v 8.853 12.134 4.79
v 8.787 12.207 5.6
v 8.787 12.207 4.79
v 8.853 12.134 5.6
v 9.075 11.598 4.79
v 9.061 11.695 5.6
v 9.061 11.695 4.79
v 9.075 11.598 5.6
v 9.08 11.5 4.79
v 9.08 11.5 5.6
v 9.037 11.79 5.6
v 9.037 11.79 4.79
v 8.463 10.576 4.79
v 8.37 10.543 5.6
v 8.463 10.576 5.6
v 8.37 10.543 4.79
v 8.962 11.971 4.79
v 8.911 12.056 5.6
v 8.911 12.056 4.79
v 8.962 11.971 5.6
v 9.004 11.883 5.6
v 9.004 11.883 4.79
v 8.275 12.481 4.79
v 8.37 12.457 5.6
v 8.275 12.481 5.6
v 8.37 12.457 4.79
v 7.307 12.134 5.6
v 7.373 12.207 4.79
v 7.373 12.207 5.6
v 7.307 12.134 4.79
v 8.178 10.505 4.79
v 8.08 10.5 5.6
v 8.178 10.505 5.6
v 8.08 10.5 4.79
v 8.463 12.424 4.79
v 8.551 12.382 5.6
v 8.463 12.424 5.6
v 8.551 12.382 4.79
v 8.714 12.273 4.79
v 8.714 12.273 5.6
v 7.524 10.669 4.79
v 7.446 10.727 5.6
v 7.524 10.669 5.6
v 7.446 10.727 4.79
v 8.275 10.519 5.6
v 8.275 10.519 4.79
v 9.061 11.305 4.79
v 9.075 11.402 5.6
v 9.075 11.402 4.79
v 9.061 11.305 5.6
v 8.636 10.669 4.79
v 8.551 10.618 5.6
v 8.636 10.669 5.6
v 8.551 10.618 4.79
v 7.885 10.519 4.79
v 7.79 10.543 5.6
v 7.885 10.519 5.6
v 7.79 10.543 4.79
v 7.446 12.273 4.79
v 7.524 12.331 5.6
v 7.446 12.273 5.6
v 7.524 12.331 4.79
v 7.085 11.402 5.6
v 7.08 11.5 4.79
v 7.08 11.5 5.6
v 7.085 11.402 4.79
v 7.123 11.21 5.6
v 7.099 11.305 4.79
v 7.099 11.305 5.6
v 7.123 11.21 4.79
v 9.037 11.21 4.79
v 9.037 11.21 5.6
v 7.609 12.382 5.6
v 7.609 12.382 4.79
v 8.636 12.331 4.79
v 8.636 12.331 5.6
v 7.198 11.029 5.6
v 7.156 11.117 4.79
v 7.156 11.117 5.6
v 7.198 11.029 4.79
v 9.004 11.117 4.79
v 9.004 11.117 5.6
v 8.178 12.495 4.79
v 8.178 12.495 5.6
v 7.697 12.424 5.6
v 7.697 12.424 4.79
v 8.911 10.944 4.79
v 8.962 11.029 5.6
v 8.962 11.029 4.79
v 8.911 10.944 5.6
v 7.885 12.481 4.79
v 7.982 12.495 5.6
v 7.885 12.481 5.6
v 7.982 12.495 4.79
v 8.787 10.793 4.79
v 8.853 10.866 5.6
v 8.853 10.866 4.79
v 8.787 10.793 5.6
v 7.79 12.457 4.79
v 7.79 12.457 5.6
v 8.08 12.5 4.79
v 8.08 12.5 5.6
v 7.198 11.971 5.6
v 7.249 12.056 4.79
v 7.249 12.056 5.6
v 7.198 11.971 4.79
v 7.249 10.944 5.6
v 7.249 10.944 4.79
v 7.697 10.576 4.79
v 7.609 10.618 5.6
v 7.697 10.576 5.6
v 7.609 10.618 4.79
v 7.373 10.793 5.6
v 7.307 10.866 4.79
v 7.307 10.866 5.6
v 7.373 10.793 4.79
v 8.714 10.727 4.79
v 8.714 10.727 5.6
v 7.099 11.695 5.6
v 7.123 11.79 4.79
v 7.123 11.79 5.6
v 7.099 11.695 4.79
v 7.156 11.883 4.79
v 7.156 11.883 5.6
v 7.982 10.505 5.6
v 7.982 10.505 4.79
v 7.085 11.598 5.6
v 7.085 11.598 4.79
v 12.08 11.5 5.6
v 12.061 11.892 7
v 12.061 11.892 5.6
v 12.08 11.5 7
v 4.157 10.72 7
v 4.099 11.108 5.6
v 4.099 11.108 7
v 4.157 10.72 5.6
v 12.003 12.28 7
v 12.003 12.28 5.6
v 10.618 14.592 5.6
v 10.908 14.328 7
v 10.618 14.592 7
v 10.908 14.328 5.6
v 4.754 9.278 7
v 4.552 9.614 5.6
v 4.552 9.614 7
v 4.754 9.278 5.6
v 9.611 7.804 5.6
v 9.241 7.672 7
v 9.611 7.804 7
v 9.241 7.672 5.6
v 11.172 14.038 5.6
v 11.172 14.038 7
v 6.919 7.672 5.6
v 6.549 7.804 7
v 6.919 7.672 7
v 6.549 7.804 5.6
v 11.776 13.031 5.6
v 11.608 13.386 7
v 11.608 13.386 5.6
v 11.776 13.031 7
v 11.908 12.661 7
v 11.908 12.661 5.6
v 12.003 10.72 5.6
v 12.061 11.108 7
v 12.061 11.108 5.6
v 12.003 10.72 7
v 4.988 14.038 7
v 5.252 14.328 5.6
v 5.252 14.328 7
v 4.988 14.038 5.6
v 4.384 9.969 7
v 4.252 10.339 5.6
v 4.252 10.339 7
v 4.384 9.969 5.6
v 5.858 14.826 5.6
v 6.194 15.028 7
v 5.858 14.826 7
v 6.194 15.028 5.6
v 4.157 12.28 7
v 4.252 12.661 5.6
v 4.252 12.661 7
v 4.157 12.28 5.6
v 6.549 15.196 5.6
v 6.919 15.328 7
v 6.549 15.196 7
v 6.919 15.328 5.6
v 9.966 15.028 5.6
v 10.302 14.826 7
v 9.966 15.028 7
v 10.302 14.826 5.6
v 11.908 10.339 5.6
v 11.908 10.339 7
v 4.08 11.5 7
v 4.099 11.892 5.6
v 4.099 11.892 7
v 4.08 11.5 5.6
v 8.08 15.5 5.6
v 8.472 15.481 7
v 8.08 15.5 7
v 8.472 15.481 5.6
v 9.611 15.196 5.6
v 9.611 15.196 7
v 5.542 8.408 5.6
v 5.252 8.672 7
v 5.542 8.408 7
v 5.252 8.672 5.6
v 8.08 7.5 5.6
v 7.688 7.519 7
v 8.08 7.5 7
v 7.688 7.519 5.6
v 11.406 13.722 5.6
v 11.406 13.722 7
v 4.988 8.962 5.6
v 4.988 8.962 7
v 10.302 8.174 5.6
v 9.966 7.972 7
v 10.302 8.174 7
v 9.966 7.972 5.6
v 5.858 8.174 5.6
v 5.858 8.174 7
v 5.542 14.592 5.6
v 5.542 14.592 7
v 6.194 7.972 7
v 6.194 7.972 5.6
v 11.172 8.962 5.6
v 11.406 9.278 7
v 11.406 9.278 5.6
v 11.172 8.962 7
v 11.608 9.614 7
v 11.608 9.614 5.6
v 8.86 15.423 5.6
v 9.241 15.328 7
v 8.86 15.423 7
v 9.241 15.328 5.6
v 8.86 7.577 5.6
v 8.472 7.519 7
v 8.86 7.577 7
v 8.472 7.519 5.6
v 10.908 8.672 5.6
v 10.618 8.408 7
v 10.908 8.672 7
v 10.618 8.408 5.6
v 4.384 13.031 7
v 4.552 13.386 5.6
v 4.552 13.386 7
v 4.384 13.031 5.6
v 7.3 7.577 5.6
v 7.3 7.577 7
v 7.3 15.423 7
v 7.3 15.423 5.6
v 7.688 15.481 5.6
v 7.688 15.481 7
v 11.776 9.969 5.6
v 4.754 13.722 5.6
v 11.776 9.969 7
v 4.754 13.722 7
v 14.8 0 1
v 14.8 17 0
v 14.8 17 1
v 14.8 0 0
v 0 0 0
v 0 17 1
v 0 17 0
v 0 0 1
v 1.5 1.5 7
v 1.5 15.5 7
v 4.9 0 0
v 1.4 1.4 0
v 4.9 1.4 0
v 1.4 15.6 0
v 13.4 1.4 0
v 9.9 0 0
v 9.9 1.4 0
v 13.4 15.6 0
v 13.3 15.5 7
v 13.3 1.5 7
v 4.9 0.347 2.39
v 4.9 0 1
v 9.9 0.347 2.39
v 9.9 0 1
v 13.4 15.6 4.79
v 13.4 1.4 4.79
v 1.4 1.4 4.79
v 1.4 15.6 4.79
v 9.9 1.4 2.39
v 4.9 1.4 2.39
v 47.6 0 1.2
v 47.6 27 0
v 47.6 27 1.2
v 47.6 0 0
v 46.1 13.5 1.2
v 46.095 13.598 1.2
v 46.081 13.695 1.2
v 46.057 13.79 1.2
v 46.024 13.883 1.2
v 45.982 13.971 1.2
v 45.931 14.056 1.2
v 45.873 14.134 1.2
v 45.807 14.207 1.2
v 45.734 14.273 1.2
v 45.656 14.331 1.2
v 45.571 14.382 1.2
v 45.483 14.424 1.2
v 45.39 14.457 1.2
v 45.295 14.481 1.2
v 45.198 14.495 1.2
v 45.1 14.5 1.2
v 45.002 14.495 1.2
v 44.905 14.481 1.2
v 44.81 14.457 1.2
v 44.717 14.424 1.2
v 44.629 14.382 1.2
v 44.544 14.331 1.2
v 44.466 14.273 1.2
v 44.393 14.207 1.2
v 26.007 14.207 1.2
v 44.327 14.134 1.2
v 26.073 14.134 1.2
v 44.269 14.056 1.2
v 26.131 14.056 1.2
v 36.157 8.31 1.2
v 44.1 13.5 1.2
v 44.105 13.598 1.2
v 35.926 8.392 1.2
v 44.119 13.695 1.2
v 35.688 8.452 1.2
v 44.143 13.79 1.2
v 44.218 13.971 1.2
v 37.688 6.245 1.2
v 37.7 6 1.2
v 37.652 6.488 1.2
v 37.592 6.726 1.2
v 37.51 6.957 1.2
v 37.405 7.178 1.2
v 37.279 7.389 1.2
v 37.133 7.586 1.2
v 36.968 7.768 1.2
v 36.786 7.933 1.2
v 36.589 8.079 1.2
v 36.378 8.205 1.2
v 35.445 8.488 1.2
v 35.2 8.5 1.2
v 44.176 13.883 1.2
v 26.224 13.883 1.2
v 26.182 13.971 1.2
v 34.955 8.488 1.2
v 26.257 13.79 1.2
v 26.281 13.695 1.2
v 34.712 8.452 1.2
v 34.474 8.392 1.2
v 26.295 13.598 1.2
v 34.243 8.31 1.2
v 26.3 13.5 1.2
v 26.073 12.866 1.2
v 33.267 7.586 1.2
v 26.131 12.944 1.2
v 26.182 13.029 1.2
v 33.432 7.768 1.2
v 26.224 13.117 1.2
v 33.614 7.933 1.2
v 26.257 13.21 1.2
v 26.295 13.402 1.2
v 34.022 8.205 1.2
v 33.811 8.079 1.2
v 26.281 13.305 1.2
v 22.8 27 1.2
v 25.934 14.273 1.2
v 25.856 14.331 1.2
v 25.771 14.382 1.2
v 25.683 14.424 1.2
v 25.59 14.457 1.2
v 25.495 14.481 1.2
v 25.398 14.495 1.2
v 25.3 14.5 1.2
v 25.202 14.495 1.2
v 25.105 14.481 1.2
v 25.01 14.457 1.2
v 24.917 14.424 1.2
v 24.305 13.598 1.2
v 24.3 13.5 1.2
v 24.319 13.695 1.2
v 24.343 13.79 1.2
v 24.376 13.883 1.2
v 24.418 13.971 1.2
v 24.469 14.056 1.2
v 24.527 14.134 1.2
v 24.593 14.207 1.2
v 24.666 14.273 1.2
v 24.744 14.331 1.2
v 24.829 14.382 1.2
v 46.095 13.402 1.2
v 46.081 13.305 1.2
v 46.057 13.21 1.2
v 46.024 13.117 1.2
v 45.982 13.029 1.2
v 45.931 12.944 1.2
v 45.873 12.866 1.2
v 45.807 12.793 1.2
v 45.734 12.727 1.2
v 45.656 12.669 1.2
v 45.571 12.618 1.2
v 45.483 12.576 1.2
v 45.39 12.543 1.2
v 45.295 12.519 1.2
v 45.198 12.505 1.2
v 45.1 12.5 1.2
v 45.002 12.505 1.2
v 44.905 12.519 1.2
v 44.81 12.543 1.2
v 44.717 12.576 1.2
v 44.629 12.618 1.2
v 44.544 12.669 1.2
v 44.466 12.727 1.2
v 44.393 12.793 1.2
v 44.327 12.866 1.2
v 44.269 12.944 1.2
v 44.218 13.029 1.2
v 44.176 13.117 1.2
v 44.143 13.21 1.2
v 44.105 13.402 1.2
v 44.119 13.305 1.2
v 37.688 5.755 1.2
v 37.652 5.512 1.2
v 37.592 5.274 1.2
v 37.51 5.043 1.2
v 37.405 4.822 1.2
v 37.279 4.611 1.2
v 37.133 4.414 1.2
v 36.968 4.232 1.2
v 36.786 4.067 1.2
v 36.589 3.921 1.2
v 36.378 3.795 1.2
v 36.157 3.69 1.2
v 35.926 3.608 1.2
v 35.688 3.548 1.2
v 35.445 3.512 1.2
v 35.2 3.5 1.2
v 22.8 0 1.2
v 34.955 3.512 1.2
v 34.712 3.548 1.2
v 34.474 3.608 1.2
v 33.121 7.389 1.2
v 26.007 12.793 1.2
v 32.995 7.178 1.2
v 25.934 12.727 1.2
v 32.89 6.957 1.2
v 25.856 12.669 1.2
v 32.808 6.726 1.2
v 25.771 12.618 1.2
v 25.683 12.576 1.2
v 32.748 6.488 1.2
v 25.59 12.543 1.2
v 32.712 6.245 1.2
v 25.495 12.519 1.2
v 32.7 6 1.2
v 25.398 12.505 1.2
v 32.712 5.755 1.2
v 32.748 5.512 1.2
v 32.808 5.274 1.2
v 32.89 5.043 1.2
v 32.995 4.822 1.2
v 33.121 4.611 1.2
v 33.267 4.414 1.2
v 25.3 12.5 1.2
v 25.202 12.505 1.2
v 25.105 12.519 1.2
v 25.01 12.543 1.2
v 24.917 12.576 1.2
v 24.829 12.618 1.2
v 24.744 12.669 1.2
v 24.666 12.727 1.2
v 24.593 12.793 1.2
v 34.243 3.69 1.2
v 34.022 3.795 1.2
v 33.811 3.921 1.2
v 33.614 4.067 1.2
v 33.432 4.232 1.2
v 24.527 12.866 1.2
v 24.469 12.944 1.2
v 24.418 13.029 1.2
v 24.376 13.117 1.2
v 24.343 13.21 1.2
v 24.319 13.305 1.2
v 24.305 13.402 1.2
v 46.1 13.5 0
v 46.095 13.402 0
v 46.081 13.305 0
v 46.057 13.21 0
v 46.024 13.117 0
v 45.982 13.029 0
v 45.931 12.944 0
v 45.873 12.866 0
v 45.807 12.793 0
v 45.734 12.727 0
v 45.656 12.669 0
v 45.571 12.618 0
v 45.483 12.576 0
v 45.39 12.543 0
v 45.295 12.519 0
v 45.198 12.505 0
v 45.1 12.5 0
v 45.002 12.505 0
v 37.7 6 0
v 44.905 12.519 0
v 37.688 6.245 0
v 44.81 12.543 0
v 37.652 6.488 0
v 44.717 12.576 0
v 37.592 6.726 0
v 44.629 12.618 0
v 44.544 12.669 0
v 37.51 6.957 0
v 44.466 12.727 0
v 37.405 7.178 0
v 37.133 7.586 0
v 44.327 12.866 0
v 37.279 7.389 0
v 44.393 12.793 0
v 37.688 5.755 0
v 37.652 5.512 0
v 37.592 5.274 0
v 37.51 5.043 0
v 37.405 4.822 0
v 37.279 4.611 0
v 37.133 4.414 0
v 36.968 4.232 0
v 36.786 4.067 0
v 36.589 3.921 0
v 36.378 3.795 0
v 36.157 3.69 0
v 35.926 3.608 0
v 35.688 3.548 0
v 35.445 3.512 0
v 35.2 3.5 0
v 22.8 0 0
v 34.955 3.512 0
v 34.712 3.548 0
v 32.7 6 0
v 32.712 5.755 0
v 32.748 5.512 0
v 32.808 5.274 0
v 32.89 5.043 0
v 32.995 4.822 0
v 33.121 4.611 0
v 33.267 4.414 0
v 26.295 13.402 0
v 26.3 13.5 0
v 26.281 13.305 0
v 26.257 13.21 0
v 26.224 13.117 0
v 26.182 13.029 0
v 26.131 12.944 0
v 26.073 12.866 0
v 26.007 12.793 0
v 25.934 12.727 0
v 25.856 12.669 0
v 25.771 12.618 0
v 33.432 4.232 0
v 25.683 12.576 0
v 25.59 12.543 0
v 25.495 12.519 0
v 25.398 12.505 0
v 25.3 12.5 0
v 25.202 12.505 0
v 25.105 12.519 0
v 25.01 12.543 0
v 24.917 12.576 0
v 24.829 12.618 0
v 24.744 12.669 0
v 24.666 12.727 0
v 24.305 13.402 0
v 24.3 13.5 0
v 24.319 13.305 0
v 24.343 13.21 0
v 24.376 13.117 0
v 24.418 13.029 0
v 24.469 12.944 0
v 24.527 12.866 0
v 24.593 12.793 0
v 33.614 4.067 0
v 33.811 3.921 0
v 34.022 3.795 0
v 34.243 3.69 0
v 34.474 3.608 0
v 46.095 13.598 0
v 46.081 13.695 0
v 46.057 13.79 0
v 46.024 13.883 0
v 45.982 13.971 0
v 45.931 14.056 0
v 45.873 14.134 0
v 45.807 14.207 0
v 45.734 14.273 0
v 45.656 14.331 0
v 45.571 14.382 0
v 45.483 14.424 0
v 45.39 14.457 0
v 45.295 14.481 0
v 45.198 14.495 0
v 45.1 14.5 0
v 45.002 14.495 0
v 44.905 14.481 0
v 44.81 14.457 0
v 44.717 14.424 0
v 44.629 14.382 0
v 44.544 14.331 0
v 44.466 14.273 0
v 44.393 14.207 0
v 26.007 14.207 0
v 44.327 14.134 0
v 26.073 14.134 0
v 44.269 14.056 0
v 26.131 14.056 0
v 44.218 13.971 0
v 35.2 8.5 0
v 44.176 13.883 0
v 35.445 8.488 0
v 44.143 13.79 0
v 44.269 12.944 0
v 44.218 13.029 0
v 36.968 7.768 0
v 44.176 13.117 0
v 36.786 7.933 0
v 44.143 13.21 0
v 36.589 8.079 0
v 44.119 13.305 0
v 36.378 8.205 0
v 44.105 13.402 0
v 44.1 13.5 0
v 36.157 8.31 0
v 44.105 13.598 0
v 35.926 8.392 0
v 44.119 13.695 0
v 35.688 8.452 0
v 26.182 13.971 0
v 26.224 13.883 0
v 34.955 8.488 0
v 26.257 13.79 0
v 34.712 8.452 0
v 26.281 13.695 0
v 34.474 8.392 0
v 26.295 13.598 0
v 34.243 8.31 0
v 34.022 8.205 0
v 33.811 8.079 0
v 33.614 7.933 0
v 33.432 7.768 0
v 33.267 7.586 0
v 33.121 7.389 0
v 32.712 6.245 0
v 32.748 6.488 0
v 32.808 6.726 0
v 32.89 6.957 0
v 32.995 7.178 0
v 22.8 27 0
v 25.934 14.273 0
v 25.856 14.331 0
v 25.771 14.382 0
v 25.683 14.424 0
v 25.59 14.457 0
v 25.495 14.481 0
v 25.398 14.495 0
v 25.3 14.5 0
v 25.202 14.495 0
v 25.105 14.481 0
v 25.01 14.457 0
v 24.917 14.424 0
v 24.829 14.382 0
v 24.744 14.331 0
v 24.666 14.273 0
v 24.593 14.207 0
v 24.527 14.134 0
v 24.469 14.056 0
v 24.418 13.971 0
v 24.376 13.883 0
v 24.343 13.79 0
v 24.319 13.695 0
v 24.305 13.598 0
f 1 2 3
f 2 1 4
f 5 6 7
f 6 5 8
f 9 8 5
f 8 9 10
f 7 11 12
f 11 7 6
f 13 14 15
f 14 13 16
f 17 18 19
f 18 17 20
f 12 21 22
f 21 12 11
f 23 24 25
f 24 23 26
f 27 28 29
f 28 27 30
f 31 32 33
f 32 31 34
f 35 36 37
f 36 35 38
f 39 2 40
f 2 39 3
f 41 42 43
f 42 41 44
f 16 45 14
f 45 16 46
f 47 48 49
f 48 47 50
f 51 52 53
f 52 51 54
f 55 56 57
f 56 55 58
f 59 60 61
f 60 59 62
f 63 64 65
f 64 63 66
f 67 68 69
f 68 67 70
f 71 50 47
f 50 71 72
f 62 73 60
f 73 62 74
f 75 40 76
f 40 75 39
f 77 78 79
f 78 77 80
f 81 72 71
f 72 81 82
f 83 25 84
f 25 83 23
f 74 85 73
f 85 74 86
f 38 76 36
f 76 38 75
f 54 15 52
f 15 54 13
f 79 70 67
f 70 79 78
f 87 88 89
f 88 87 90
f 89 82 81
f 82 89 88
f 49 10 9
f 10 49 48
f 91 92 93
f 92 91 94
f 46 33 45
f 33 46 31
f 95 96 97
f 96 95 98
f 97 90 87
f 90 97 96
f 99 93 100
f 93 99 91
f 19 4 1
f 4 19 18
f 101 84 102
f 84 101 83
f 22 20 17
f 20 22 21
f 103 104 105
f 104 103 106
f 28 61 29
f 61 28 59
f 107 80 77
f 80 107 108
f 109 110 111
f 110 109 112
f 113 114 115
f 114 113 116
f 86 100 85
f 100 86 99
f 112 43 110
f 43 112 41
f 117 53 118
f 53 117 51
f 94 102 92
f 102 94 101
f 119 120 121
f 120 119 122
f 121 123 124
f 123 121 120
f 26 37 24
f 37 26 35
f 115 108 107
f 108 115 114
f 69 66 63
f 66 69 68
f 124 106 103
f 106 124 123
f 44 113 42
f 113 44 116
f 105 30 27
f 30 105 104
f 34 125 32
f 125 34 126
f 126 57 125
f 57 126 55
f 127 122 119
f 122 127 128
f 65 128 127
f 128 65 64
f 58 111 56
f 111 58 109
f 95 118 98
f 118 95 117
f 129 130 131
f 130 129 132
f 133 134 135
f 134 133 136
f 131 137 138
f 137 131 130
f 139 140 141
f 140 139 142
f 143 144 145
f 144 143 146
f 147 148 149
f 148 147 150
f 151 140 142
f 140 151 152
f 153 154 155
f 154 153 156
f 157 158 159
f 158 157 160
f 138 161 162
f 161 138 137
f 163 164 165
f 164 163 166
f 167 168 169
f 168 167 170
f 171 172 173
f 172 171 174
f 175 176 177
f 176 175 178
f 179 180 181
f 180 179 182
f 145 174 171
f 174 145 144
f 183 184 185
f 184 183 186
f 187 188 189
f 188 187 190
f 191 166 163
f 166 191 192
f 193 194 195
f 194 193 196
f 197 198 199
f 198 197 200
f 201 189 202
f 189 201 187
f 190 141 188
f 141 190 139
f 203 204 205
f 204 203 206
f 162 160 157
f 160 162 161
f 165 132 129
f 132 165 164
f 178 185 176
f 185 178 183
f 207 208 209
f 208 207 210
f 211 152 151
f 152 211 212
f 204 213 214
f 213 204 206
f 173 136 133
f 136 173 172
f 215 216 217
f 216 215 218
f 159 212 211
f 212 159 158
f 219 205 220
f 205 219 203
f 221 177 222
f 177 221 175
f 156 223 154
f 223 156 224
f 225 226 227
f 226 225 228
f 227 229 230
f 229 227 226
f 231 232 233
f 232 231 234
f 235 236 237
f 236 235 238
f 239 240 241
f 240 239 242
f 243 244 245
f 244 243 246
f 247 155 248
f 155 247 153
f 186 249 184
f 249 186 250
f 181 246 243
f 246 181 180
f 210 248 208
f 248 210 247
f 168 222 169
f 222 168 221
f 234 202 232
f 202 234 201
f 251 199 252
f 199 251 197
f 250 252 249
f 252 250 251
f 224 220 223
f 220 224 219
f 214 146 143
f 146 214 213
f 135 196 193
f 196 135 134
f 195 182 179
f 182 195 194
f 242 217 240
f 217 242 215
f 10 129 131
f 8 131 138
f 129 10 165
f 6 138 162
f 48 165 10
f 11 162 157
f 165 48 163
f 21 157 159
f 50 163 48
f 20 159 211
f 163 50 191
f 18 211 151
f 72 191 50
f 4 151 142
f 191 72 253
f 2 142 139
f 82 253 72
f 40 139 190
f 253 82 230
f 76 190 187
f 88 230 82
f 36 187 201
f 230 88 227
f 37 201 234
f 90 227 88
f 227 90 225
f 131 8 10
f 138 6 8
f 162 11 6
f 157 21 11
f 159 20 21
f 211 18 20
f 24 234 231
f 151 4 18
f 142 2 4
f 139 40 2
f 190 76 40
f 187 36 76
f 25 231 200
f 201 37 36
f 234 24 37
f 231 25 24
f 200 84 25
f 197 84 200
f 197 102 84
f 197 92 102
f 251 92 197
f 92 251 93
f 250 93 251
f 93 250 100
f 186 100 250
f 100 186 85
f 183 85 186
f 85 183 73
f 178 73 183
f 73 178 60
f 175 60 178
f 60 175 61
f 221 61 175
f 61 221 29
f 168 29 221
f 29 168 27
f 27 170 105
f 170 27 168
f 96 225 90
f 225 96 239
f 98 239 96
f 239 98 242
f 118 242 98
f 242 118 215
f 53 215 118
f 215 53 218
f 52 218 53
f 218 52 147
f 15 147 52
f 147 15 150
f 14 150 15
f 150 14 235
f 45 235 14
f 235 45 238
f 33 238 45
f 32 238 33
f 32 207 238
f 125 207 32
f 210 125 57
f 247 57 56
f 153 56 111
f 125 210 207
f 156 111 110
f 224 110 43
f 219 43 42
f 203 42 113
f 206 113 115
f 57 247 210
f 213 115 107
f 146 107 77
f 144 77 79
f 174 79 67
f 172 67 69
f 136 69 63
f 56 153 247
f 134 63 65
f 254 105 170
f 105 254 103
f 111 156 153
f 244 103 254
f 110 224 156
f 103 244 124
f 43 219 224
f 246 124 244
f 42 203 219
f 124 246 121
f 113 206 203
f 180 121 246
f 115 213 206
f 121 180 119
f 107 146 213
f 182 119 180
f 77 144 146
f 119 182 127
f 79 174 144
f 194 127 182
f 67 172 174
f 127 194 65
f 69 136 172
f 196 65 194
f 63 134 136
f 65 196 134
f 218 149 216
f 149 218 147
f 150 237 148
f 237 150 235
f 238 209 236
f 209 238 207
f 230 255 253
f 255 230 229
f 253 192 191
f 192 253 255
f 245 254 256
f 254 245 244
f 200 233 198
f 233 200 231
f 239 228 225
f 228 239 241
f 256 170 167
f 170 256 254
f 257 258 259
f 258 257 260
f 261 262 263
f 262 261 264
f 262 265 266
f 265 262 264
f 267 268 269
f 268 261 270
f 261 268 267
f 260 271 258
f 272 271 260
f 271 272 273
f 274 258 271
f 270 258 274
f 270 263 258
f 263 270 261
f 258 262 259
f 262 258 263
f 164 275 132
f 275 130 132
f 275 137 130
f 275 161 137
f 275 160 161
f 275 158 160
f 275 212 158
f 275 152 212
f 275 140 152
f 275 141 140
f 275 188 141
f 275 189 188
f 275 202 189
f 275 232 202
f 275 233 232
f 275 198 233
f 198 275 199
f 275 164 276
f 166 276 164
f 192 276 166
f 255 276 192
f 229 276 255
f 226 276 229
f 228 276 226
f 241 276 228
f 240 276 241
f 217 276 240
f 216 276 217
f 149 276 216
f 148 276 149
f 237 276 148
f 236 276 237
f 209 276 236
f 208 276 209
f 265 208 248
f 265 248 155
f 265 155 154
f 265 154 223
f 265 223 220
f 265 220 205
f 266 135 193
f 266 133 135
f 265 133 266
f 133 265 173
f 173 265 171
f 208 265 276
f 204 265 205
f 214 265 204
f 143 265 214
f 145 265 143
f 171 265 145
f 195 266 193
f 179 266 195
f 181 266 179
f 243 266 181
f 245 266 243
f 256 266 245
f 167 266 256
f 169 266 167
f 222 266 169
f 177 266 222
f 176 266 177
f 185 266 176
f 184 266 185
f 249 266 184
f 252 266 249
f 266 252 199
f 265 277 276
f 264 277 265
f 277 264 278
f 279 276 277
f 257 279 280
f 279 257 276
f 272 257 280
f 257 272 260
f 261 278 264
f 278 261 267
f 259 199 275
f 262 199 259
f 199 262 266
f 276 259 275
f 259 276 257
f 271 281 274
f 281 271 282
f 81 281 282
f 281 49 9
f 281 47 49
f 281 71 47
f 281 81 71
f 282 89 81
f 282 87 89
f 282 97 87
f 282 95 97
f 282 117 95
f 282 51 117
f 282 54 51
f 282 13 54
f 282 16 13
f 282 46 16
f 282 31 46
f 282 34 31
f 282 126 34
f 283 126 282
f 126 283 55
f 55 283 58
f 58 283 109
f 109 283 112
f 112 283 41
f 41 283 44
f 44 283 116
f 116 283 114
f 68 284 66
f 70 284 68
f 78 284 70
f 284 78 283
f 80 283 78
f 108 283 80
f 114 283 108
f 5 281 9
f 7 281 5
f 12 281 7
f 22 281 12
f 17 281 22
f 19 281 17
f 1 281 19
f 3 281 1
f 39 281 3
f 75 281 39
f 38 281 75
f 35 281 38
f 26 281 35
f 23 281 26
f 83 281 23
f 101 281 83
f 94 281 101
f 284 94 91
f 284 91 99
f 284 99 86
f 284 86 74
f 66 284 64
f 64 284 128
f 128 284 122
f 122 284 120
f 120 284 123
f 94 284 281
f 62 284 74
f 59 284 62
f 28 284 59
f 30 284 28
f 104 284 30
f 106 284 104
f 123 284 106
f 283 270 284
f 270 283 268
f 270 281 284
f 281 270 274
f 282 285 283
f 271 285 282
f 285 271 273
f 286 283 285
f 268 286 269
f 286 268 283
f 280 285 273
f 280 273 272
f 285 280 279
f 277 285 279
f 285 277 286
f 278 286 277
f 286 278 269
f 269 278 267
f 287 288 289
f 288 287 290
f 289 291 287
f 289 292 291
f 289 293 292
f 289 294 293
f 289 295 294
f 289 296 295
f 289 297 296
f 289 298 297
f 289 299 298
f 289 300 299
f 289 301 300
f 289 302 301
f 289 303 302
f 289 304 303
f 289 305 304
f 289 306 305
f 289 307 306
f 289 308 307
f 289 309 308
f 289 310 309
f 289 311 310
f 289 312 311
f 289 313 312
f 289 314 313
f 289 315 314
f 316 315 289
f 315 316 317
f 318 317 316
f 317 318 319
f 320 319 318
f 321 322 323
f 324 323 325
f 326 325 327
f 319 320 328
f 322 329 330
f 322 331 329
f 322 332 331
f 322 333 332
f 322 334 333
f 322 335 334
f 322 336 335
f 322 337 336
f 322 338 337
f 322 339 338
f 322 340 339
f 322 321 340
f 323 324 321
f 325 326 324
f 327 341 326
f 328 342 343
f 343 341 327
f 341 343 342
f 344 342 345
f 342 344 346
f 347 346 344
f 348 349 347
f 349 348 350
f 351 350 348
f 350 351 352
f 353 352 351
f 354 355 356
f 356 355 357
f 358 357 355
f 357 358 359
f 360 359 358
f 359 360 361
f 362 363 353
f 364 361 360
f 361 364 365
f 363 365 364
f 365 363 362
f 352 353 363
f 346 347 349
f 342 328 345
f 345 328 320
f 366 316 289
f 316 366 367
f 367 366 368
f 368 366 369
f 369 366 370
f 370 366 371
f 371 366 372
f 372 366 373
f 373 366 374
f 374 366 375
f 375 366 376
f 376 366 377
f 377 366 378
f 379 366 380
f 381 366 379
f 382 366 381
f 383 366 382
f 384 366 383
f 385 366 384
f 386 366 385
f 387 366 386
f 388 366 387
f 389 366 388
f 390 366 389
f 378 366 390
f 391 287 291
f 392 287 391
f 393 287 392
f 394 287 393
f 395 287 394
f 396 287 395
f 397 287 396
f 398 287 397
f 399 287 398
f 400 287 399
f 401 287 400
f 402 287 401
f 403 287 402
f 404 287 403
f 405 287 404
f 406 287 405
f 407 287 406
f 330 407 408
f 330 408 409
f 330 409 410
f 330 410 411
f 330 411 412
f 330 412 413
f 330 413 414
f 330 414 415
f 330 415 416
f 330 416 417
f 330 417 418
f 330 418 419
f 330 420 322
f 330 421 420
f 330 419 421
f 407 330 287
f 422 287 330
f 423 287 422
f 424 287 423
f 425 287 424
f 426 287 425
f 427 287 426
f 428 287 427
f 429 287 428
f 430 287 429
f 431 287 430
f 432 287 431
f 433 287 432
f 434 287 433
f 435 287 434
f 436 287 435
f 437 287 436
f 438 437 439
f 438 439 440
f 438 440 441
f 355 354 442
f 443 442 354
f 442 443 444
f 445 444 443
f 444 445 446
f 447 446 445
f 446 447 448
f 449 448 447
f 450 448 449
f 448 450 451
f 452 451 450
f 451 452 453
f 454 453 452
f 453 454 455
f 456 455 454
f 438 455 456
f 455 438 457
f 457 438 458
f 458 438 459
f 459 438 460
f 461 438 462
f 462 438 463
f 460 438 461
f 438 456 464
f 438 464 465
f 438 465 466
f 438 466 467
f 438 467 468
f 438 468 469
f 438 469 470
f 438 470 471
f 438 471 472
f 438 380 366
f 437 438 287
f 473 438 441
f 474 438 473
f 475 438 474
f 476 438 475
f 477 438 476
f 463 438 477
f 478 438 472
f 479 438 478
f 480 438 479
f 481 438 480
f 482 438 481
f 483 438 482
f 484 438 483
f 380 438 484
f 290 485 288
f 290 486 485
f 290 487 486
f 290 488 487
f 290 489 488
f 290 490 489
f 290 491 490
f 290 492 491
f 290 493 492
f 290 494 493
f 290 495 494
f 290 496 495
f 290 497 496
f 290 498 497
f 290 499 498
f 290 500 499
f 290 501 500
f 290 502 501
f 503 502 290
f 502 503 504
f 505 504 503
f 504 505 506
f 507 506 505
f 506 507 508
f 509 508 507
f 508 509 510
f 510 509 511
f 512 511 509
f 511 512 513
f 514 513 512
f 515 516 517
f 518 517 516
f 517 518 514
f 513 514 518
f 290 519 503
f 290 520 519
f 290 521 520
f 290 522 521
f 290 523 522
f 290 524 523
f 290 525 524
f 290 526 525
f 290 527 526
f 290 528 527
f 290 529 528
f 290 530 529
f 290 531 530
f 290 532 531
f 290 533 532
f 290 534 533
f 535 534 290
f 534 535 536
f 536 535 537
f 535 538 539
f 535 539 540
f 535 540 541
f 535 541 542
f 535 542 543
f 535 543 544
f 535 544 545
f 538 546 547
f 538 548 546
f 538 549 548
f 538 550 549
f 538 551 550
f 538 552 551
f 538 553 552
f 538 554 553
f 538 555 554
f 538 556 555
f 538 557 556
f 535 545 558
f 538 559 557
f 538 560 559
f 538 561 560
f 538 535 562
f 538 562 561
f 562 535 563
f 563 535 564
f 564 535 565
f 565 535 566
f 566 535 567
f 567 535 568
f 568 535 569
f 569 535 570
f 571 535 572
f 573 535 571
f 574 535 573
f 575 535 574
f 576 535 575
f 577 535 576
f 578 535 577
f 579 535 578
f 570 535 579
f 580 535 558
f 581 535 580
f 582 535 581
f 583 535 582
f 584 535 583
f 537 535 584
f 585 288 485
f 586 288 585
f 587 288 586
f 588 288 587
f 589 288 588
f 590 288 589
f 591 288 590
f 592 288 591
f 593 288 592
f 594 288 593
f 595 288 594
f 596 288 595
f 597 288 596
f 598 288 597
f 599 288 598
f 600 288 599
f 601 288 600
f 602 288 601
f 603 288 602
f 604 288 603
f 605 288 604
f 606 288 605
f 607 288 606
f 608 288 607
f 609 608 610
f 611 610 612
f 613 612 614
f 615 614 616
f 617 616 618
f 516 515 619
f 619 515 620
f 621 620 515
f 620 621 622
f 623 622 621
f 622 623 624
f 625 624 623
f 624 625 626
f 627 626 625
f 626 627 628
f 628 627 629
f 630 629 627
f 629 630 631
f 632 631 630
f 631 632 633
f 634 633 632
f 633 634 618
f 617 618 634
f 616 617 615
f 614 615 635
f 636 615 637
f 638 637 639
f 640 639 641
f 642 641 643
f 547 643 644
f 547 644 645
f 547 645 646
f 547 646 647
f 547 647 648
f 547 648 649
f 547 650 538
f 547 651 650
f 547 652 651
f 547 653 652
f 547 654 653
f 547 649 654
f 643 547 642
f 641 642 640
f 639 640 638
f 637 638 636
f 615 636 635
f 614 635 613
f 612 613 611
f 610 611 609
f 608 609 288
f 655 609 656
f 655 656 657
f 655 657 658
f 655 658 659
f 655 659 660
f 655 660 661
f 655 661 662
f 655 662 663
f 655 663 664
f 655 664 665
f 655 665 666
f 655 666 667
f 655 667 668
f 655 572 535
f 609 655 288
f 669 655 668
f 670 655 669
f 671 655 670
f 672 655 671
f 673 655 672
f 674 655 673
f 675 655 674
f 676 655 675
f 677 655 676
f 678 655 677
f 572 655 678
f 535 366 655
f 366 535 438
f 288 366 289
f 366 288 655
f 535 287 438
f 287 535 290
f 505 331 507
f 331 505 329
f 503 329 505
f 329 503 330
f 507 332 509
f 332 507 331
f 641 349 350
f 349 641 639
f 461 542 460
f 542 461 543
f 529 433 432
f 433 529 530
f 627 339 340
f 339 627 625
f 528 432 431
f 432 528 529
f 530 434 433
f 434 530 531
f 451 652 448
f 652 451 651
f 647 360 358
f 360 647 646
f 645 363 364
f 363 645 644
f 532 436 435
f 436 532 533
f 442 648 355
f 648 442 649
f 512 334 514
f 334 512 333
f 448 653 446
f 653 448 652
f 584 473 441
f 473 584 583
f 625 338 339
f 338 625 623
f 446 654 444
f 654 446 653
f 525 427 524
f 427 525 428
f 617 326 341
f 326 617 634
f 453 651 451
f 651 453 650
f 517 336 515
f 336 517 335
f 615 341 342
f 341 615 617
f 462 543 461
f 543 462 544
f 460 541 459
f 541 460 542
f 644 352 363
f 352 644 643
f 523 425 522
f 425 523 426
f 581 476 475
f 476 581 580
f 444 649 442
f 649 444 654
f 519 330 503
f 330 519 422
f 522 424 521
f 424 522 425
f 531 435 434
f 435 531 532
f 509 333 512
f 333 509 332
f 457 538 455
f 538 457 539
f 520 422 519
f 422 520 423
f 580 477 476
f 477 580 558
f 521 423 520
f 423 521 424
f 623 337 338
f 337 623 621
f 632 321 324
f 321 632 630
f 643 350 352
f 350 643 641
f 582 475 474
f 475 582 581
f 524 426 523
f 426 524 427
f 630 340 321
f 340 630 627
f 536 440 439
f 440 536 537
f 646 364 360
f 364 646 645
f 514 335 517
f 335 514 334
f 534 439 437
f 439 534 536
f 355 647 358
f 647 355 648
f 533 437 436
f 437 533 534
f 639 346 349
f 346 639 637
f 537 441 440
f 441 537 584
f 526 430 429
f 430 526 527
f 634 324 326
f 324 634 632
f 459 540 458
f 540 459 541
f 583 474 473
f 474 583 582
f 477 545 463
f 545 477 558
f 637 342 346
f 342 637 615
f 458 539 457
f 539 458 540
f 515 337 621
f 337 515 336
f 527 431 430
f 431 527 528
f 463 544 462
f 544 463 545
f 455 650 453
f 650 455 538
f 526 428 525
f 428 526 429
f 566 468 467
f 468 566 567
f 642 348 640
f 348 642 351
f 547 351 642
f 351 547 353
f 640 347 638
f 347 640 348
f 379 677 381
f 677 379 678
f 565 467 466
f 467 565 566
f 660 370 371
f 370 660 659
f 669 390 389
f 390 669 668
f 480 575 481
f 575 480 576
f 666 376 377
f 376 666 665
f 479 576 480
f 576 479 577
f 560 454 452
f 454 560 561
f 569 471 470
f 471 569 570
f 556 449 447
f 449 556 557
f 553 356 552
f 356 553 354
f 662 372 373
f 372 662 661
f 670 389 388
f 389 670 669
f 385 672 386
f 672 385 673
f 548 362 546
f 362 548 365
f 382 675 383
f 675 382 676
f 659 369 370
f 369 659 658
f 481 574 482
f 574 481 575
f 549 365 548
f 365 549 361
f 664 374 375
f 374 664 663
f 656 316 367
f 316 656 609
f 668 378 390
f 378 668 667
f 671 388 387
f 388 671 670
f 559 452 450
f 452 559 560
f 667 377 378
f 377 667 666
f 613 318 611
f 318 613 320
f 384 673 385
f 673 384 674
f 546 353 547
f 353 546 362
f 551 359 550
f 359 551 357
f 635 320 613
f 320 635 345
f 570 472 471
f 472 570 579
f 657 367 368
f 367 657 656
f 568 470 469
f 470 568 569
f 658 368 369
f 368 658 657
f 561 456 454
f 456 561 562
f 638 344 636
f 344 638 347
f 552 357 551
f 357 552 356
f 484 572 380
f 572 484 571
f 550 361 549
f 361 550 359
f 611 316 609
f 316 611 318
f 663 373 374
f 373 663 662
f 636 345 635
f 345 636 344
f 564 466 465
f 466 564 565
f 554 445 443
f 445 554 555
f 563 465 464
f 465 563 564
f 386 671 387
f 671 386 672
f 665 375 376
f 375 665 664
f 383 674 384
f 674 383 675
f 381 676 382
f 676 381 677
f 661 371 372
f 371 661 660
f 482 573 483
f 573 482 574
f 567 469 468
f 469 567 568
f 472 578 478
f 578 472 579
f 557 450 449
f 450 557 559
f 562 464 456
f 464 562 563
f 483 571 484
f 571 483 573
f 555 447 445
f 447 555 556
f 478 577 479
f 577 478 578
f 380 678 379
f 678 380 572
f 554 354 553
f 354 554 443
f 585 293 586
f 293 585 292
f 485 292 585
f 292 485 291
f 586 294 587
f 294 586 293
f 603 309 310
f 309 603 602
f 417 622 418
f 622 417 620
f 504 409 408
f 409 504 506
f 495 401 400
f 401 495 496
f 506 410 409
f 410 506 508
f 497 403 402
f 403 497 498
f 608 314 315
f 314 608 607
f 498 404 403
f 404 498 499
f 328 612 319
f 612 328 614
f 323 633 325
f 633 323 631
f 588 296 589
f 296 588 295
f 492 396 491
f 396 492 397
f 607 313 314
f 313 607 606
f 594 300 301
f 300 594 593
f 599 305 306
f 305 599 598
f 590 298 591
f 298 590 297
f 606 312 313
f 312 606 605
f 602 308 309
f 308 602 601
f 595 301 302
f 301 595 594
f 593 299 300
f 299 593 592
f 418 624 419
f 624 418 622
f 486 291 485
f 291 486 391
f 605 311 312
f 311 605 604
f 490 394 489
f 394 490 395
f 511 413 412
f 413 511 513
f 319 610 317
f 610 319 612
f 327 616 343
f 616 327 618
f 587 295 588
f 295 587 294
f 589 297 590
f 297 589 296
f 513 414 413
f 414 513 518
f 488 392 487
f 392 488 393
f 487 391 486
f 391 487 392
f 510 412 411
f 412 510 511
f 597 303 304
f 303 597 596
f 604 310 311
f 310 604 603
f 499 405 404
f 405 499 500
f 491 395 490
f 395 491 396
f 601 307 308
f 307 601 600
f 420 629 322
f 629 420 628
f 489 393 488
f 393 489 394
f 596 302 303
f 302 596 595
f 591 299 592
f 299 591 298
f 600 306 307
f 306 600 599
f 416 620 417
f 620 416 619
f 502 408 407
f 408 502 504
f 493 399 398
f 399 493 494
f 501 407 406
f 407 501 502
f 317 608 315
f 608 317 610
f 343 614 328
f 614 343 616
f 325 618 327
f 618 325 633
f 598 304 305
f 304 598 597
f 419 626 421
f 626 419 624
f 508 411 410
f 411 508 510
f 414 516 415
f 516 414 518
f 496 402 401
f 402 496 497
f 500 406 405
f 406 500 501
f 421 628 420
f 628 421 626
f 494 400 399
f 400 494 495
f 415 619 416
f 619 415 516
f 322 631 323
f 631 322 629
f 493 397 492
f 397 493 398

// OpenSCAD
// file: params.scad
// ANC helmet - shared mechanical parameters (mm).
// MEASURE YOUR EARMUFF and edit the "cup" block; everything else follows.

// ---- helmet-mount earmuff cup (inside, after removing the stock foam insert) ----
cup_a        = 72;    // inner long axis (vertical when worn)
cup_b        = 62;    // inner short axis
cup_depth    = 32;    // inner depth, rim to back wall
cup_wall     = 2.5;   // shell thickness where the outside mic sits

// ---- boards (must match hardware/gen/layouts.py; `python3 check_fit.py` verifies) ----
main_w = 60;  main_h = 50;  main_r = 14;
main_holes = [[7.2, 8.8], [52.8, 42.8], [6.8, 43.2]];  // from the board's top-left corner
sat_w  = 34;  sat_h  = 26;  sat_r  = 5;
sat_holes  = [[9.5, 3.5], [30, 22]];
mic_w  = 11;  mic_h  = 13.2;
mic_port   = [6.18, 3.6];                           // sound hole on the mic board (PCB underside)
pcb_t  = 1.6;

// ---- parts that live in the cups ----
driver_d      = 40.2;   // 40 mm headphone driver
driver_depth  = 6.0;
batt          = [50, 34, 10.5];   // 103450 LiPo pouch, 2000 mAh (with protection PCB)
m2_clear      = 2.3;
m2_insert_d   = 3.2;    // heat-set insert hole
standoff_h    = 4.0;

$fn = 64;

module rounded_rect(w, h, r, t) {
    linear_extrude(t) offset(r) offset(-r) square([w, h]);
}

module ellipse(a, b, t) { linear_extrude(t) scale([a / 2, b / 2]) circle(1); }
// main file
// Outside (reference) mic pod: glued/screwed onto the outside of the cup shell.
// The mic board sits plain-side-out behind a mesh window; the recess takes a
// 3 mm open-cell foam disc as a wind screen (wind noise wrecks feed-forward ANC).
include <params.scad>

part = "all";   // openscad -D 'part="..."' exports one part

wall = 1.4;
pod  = [mic_w + 2 * wall + 1, mic_h + 2 * wall + 1, 7];

module ref_mic_pod() {
    difference() {
        hull() {
            translate([0, 0, 0]) cube([pod[0], pod[1], 1]);
            translate([1.5, 1.5, pod[2] - 1]) cube([pod[0] - 3, pod[1] - 3, 1]);
        }
        // board pocket (opens to the cup side)
        translate([wall, wall, -0.01]) cube([mic_w + 1, mic_h + 1, pcb_t + 3.2]);
        // acoustic port in front of the PCB sound hole + foam recess
        translate([wall + 0.5 + mic_port[0], wall + 0.5 + (mic_h - mic_port[1]), 0]) {
            cylinder(d = 2.0, h = 20);
            translate([0, 0, pcb_t + 3.2 + 0.8]) cylinder(d = 8, h = 20);
        }
        // cable exit through the shell
        translate([pod[0] / 2 - 2.5, -1, -0.01]) cube([5, wall + 2, 2.4]);
    }
}

// drill guide for the shell: marks the cable hole and the two pod-screw holes
module drill_template() {
    difference() {
        cube([pod[0] + 10, pod[1] + 10, 1.2]);
        translate([5 + pod[0] / 2, 5 + 1, -1]) cylinder(d = 5, h = 5);
        translate([2.5, (pod[1] + 10) / 2, -1]) cylinder(d = 2, h = 5);
        translate([pod[0] + 7.5, (pod[1] + 10) / 2, -1]) cylinder(d = 2, h = 5);
    }
}

if (part == "all") ref_mic_pod();
if (part == "pod") ref_mic_pod();
if (part == "all") translate([pod[0] + 8, 0, 0]) drill_template();
if (part == "template") drill_template();
